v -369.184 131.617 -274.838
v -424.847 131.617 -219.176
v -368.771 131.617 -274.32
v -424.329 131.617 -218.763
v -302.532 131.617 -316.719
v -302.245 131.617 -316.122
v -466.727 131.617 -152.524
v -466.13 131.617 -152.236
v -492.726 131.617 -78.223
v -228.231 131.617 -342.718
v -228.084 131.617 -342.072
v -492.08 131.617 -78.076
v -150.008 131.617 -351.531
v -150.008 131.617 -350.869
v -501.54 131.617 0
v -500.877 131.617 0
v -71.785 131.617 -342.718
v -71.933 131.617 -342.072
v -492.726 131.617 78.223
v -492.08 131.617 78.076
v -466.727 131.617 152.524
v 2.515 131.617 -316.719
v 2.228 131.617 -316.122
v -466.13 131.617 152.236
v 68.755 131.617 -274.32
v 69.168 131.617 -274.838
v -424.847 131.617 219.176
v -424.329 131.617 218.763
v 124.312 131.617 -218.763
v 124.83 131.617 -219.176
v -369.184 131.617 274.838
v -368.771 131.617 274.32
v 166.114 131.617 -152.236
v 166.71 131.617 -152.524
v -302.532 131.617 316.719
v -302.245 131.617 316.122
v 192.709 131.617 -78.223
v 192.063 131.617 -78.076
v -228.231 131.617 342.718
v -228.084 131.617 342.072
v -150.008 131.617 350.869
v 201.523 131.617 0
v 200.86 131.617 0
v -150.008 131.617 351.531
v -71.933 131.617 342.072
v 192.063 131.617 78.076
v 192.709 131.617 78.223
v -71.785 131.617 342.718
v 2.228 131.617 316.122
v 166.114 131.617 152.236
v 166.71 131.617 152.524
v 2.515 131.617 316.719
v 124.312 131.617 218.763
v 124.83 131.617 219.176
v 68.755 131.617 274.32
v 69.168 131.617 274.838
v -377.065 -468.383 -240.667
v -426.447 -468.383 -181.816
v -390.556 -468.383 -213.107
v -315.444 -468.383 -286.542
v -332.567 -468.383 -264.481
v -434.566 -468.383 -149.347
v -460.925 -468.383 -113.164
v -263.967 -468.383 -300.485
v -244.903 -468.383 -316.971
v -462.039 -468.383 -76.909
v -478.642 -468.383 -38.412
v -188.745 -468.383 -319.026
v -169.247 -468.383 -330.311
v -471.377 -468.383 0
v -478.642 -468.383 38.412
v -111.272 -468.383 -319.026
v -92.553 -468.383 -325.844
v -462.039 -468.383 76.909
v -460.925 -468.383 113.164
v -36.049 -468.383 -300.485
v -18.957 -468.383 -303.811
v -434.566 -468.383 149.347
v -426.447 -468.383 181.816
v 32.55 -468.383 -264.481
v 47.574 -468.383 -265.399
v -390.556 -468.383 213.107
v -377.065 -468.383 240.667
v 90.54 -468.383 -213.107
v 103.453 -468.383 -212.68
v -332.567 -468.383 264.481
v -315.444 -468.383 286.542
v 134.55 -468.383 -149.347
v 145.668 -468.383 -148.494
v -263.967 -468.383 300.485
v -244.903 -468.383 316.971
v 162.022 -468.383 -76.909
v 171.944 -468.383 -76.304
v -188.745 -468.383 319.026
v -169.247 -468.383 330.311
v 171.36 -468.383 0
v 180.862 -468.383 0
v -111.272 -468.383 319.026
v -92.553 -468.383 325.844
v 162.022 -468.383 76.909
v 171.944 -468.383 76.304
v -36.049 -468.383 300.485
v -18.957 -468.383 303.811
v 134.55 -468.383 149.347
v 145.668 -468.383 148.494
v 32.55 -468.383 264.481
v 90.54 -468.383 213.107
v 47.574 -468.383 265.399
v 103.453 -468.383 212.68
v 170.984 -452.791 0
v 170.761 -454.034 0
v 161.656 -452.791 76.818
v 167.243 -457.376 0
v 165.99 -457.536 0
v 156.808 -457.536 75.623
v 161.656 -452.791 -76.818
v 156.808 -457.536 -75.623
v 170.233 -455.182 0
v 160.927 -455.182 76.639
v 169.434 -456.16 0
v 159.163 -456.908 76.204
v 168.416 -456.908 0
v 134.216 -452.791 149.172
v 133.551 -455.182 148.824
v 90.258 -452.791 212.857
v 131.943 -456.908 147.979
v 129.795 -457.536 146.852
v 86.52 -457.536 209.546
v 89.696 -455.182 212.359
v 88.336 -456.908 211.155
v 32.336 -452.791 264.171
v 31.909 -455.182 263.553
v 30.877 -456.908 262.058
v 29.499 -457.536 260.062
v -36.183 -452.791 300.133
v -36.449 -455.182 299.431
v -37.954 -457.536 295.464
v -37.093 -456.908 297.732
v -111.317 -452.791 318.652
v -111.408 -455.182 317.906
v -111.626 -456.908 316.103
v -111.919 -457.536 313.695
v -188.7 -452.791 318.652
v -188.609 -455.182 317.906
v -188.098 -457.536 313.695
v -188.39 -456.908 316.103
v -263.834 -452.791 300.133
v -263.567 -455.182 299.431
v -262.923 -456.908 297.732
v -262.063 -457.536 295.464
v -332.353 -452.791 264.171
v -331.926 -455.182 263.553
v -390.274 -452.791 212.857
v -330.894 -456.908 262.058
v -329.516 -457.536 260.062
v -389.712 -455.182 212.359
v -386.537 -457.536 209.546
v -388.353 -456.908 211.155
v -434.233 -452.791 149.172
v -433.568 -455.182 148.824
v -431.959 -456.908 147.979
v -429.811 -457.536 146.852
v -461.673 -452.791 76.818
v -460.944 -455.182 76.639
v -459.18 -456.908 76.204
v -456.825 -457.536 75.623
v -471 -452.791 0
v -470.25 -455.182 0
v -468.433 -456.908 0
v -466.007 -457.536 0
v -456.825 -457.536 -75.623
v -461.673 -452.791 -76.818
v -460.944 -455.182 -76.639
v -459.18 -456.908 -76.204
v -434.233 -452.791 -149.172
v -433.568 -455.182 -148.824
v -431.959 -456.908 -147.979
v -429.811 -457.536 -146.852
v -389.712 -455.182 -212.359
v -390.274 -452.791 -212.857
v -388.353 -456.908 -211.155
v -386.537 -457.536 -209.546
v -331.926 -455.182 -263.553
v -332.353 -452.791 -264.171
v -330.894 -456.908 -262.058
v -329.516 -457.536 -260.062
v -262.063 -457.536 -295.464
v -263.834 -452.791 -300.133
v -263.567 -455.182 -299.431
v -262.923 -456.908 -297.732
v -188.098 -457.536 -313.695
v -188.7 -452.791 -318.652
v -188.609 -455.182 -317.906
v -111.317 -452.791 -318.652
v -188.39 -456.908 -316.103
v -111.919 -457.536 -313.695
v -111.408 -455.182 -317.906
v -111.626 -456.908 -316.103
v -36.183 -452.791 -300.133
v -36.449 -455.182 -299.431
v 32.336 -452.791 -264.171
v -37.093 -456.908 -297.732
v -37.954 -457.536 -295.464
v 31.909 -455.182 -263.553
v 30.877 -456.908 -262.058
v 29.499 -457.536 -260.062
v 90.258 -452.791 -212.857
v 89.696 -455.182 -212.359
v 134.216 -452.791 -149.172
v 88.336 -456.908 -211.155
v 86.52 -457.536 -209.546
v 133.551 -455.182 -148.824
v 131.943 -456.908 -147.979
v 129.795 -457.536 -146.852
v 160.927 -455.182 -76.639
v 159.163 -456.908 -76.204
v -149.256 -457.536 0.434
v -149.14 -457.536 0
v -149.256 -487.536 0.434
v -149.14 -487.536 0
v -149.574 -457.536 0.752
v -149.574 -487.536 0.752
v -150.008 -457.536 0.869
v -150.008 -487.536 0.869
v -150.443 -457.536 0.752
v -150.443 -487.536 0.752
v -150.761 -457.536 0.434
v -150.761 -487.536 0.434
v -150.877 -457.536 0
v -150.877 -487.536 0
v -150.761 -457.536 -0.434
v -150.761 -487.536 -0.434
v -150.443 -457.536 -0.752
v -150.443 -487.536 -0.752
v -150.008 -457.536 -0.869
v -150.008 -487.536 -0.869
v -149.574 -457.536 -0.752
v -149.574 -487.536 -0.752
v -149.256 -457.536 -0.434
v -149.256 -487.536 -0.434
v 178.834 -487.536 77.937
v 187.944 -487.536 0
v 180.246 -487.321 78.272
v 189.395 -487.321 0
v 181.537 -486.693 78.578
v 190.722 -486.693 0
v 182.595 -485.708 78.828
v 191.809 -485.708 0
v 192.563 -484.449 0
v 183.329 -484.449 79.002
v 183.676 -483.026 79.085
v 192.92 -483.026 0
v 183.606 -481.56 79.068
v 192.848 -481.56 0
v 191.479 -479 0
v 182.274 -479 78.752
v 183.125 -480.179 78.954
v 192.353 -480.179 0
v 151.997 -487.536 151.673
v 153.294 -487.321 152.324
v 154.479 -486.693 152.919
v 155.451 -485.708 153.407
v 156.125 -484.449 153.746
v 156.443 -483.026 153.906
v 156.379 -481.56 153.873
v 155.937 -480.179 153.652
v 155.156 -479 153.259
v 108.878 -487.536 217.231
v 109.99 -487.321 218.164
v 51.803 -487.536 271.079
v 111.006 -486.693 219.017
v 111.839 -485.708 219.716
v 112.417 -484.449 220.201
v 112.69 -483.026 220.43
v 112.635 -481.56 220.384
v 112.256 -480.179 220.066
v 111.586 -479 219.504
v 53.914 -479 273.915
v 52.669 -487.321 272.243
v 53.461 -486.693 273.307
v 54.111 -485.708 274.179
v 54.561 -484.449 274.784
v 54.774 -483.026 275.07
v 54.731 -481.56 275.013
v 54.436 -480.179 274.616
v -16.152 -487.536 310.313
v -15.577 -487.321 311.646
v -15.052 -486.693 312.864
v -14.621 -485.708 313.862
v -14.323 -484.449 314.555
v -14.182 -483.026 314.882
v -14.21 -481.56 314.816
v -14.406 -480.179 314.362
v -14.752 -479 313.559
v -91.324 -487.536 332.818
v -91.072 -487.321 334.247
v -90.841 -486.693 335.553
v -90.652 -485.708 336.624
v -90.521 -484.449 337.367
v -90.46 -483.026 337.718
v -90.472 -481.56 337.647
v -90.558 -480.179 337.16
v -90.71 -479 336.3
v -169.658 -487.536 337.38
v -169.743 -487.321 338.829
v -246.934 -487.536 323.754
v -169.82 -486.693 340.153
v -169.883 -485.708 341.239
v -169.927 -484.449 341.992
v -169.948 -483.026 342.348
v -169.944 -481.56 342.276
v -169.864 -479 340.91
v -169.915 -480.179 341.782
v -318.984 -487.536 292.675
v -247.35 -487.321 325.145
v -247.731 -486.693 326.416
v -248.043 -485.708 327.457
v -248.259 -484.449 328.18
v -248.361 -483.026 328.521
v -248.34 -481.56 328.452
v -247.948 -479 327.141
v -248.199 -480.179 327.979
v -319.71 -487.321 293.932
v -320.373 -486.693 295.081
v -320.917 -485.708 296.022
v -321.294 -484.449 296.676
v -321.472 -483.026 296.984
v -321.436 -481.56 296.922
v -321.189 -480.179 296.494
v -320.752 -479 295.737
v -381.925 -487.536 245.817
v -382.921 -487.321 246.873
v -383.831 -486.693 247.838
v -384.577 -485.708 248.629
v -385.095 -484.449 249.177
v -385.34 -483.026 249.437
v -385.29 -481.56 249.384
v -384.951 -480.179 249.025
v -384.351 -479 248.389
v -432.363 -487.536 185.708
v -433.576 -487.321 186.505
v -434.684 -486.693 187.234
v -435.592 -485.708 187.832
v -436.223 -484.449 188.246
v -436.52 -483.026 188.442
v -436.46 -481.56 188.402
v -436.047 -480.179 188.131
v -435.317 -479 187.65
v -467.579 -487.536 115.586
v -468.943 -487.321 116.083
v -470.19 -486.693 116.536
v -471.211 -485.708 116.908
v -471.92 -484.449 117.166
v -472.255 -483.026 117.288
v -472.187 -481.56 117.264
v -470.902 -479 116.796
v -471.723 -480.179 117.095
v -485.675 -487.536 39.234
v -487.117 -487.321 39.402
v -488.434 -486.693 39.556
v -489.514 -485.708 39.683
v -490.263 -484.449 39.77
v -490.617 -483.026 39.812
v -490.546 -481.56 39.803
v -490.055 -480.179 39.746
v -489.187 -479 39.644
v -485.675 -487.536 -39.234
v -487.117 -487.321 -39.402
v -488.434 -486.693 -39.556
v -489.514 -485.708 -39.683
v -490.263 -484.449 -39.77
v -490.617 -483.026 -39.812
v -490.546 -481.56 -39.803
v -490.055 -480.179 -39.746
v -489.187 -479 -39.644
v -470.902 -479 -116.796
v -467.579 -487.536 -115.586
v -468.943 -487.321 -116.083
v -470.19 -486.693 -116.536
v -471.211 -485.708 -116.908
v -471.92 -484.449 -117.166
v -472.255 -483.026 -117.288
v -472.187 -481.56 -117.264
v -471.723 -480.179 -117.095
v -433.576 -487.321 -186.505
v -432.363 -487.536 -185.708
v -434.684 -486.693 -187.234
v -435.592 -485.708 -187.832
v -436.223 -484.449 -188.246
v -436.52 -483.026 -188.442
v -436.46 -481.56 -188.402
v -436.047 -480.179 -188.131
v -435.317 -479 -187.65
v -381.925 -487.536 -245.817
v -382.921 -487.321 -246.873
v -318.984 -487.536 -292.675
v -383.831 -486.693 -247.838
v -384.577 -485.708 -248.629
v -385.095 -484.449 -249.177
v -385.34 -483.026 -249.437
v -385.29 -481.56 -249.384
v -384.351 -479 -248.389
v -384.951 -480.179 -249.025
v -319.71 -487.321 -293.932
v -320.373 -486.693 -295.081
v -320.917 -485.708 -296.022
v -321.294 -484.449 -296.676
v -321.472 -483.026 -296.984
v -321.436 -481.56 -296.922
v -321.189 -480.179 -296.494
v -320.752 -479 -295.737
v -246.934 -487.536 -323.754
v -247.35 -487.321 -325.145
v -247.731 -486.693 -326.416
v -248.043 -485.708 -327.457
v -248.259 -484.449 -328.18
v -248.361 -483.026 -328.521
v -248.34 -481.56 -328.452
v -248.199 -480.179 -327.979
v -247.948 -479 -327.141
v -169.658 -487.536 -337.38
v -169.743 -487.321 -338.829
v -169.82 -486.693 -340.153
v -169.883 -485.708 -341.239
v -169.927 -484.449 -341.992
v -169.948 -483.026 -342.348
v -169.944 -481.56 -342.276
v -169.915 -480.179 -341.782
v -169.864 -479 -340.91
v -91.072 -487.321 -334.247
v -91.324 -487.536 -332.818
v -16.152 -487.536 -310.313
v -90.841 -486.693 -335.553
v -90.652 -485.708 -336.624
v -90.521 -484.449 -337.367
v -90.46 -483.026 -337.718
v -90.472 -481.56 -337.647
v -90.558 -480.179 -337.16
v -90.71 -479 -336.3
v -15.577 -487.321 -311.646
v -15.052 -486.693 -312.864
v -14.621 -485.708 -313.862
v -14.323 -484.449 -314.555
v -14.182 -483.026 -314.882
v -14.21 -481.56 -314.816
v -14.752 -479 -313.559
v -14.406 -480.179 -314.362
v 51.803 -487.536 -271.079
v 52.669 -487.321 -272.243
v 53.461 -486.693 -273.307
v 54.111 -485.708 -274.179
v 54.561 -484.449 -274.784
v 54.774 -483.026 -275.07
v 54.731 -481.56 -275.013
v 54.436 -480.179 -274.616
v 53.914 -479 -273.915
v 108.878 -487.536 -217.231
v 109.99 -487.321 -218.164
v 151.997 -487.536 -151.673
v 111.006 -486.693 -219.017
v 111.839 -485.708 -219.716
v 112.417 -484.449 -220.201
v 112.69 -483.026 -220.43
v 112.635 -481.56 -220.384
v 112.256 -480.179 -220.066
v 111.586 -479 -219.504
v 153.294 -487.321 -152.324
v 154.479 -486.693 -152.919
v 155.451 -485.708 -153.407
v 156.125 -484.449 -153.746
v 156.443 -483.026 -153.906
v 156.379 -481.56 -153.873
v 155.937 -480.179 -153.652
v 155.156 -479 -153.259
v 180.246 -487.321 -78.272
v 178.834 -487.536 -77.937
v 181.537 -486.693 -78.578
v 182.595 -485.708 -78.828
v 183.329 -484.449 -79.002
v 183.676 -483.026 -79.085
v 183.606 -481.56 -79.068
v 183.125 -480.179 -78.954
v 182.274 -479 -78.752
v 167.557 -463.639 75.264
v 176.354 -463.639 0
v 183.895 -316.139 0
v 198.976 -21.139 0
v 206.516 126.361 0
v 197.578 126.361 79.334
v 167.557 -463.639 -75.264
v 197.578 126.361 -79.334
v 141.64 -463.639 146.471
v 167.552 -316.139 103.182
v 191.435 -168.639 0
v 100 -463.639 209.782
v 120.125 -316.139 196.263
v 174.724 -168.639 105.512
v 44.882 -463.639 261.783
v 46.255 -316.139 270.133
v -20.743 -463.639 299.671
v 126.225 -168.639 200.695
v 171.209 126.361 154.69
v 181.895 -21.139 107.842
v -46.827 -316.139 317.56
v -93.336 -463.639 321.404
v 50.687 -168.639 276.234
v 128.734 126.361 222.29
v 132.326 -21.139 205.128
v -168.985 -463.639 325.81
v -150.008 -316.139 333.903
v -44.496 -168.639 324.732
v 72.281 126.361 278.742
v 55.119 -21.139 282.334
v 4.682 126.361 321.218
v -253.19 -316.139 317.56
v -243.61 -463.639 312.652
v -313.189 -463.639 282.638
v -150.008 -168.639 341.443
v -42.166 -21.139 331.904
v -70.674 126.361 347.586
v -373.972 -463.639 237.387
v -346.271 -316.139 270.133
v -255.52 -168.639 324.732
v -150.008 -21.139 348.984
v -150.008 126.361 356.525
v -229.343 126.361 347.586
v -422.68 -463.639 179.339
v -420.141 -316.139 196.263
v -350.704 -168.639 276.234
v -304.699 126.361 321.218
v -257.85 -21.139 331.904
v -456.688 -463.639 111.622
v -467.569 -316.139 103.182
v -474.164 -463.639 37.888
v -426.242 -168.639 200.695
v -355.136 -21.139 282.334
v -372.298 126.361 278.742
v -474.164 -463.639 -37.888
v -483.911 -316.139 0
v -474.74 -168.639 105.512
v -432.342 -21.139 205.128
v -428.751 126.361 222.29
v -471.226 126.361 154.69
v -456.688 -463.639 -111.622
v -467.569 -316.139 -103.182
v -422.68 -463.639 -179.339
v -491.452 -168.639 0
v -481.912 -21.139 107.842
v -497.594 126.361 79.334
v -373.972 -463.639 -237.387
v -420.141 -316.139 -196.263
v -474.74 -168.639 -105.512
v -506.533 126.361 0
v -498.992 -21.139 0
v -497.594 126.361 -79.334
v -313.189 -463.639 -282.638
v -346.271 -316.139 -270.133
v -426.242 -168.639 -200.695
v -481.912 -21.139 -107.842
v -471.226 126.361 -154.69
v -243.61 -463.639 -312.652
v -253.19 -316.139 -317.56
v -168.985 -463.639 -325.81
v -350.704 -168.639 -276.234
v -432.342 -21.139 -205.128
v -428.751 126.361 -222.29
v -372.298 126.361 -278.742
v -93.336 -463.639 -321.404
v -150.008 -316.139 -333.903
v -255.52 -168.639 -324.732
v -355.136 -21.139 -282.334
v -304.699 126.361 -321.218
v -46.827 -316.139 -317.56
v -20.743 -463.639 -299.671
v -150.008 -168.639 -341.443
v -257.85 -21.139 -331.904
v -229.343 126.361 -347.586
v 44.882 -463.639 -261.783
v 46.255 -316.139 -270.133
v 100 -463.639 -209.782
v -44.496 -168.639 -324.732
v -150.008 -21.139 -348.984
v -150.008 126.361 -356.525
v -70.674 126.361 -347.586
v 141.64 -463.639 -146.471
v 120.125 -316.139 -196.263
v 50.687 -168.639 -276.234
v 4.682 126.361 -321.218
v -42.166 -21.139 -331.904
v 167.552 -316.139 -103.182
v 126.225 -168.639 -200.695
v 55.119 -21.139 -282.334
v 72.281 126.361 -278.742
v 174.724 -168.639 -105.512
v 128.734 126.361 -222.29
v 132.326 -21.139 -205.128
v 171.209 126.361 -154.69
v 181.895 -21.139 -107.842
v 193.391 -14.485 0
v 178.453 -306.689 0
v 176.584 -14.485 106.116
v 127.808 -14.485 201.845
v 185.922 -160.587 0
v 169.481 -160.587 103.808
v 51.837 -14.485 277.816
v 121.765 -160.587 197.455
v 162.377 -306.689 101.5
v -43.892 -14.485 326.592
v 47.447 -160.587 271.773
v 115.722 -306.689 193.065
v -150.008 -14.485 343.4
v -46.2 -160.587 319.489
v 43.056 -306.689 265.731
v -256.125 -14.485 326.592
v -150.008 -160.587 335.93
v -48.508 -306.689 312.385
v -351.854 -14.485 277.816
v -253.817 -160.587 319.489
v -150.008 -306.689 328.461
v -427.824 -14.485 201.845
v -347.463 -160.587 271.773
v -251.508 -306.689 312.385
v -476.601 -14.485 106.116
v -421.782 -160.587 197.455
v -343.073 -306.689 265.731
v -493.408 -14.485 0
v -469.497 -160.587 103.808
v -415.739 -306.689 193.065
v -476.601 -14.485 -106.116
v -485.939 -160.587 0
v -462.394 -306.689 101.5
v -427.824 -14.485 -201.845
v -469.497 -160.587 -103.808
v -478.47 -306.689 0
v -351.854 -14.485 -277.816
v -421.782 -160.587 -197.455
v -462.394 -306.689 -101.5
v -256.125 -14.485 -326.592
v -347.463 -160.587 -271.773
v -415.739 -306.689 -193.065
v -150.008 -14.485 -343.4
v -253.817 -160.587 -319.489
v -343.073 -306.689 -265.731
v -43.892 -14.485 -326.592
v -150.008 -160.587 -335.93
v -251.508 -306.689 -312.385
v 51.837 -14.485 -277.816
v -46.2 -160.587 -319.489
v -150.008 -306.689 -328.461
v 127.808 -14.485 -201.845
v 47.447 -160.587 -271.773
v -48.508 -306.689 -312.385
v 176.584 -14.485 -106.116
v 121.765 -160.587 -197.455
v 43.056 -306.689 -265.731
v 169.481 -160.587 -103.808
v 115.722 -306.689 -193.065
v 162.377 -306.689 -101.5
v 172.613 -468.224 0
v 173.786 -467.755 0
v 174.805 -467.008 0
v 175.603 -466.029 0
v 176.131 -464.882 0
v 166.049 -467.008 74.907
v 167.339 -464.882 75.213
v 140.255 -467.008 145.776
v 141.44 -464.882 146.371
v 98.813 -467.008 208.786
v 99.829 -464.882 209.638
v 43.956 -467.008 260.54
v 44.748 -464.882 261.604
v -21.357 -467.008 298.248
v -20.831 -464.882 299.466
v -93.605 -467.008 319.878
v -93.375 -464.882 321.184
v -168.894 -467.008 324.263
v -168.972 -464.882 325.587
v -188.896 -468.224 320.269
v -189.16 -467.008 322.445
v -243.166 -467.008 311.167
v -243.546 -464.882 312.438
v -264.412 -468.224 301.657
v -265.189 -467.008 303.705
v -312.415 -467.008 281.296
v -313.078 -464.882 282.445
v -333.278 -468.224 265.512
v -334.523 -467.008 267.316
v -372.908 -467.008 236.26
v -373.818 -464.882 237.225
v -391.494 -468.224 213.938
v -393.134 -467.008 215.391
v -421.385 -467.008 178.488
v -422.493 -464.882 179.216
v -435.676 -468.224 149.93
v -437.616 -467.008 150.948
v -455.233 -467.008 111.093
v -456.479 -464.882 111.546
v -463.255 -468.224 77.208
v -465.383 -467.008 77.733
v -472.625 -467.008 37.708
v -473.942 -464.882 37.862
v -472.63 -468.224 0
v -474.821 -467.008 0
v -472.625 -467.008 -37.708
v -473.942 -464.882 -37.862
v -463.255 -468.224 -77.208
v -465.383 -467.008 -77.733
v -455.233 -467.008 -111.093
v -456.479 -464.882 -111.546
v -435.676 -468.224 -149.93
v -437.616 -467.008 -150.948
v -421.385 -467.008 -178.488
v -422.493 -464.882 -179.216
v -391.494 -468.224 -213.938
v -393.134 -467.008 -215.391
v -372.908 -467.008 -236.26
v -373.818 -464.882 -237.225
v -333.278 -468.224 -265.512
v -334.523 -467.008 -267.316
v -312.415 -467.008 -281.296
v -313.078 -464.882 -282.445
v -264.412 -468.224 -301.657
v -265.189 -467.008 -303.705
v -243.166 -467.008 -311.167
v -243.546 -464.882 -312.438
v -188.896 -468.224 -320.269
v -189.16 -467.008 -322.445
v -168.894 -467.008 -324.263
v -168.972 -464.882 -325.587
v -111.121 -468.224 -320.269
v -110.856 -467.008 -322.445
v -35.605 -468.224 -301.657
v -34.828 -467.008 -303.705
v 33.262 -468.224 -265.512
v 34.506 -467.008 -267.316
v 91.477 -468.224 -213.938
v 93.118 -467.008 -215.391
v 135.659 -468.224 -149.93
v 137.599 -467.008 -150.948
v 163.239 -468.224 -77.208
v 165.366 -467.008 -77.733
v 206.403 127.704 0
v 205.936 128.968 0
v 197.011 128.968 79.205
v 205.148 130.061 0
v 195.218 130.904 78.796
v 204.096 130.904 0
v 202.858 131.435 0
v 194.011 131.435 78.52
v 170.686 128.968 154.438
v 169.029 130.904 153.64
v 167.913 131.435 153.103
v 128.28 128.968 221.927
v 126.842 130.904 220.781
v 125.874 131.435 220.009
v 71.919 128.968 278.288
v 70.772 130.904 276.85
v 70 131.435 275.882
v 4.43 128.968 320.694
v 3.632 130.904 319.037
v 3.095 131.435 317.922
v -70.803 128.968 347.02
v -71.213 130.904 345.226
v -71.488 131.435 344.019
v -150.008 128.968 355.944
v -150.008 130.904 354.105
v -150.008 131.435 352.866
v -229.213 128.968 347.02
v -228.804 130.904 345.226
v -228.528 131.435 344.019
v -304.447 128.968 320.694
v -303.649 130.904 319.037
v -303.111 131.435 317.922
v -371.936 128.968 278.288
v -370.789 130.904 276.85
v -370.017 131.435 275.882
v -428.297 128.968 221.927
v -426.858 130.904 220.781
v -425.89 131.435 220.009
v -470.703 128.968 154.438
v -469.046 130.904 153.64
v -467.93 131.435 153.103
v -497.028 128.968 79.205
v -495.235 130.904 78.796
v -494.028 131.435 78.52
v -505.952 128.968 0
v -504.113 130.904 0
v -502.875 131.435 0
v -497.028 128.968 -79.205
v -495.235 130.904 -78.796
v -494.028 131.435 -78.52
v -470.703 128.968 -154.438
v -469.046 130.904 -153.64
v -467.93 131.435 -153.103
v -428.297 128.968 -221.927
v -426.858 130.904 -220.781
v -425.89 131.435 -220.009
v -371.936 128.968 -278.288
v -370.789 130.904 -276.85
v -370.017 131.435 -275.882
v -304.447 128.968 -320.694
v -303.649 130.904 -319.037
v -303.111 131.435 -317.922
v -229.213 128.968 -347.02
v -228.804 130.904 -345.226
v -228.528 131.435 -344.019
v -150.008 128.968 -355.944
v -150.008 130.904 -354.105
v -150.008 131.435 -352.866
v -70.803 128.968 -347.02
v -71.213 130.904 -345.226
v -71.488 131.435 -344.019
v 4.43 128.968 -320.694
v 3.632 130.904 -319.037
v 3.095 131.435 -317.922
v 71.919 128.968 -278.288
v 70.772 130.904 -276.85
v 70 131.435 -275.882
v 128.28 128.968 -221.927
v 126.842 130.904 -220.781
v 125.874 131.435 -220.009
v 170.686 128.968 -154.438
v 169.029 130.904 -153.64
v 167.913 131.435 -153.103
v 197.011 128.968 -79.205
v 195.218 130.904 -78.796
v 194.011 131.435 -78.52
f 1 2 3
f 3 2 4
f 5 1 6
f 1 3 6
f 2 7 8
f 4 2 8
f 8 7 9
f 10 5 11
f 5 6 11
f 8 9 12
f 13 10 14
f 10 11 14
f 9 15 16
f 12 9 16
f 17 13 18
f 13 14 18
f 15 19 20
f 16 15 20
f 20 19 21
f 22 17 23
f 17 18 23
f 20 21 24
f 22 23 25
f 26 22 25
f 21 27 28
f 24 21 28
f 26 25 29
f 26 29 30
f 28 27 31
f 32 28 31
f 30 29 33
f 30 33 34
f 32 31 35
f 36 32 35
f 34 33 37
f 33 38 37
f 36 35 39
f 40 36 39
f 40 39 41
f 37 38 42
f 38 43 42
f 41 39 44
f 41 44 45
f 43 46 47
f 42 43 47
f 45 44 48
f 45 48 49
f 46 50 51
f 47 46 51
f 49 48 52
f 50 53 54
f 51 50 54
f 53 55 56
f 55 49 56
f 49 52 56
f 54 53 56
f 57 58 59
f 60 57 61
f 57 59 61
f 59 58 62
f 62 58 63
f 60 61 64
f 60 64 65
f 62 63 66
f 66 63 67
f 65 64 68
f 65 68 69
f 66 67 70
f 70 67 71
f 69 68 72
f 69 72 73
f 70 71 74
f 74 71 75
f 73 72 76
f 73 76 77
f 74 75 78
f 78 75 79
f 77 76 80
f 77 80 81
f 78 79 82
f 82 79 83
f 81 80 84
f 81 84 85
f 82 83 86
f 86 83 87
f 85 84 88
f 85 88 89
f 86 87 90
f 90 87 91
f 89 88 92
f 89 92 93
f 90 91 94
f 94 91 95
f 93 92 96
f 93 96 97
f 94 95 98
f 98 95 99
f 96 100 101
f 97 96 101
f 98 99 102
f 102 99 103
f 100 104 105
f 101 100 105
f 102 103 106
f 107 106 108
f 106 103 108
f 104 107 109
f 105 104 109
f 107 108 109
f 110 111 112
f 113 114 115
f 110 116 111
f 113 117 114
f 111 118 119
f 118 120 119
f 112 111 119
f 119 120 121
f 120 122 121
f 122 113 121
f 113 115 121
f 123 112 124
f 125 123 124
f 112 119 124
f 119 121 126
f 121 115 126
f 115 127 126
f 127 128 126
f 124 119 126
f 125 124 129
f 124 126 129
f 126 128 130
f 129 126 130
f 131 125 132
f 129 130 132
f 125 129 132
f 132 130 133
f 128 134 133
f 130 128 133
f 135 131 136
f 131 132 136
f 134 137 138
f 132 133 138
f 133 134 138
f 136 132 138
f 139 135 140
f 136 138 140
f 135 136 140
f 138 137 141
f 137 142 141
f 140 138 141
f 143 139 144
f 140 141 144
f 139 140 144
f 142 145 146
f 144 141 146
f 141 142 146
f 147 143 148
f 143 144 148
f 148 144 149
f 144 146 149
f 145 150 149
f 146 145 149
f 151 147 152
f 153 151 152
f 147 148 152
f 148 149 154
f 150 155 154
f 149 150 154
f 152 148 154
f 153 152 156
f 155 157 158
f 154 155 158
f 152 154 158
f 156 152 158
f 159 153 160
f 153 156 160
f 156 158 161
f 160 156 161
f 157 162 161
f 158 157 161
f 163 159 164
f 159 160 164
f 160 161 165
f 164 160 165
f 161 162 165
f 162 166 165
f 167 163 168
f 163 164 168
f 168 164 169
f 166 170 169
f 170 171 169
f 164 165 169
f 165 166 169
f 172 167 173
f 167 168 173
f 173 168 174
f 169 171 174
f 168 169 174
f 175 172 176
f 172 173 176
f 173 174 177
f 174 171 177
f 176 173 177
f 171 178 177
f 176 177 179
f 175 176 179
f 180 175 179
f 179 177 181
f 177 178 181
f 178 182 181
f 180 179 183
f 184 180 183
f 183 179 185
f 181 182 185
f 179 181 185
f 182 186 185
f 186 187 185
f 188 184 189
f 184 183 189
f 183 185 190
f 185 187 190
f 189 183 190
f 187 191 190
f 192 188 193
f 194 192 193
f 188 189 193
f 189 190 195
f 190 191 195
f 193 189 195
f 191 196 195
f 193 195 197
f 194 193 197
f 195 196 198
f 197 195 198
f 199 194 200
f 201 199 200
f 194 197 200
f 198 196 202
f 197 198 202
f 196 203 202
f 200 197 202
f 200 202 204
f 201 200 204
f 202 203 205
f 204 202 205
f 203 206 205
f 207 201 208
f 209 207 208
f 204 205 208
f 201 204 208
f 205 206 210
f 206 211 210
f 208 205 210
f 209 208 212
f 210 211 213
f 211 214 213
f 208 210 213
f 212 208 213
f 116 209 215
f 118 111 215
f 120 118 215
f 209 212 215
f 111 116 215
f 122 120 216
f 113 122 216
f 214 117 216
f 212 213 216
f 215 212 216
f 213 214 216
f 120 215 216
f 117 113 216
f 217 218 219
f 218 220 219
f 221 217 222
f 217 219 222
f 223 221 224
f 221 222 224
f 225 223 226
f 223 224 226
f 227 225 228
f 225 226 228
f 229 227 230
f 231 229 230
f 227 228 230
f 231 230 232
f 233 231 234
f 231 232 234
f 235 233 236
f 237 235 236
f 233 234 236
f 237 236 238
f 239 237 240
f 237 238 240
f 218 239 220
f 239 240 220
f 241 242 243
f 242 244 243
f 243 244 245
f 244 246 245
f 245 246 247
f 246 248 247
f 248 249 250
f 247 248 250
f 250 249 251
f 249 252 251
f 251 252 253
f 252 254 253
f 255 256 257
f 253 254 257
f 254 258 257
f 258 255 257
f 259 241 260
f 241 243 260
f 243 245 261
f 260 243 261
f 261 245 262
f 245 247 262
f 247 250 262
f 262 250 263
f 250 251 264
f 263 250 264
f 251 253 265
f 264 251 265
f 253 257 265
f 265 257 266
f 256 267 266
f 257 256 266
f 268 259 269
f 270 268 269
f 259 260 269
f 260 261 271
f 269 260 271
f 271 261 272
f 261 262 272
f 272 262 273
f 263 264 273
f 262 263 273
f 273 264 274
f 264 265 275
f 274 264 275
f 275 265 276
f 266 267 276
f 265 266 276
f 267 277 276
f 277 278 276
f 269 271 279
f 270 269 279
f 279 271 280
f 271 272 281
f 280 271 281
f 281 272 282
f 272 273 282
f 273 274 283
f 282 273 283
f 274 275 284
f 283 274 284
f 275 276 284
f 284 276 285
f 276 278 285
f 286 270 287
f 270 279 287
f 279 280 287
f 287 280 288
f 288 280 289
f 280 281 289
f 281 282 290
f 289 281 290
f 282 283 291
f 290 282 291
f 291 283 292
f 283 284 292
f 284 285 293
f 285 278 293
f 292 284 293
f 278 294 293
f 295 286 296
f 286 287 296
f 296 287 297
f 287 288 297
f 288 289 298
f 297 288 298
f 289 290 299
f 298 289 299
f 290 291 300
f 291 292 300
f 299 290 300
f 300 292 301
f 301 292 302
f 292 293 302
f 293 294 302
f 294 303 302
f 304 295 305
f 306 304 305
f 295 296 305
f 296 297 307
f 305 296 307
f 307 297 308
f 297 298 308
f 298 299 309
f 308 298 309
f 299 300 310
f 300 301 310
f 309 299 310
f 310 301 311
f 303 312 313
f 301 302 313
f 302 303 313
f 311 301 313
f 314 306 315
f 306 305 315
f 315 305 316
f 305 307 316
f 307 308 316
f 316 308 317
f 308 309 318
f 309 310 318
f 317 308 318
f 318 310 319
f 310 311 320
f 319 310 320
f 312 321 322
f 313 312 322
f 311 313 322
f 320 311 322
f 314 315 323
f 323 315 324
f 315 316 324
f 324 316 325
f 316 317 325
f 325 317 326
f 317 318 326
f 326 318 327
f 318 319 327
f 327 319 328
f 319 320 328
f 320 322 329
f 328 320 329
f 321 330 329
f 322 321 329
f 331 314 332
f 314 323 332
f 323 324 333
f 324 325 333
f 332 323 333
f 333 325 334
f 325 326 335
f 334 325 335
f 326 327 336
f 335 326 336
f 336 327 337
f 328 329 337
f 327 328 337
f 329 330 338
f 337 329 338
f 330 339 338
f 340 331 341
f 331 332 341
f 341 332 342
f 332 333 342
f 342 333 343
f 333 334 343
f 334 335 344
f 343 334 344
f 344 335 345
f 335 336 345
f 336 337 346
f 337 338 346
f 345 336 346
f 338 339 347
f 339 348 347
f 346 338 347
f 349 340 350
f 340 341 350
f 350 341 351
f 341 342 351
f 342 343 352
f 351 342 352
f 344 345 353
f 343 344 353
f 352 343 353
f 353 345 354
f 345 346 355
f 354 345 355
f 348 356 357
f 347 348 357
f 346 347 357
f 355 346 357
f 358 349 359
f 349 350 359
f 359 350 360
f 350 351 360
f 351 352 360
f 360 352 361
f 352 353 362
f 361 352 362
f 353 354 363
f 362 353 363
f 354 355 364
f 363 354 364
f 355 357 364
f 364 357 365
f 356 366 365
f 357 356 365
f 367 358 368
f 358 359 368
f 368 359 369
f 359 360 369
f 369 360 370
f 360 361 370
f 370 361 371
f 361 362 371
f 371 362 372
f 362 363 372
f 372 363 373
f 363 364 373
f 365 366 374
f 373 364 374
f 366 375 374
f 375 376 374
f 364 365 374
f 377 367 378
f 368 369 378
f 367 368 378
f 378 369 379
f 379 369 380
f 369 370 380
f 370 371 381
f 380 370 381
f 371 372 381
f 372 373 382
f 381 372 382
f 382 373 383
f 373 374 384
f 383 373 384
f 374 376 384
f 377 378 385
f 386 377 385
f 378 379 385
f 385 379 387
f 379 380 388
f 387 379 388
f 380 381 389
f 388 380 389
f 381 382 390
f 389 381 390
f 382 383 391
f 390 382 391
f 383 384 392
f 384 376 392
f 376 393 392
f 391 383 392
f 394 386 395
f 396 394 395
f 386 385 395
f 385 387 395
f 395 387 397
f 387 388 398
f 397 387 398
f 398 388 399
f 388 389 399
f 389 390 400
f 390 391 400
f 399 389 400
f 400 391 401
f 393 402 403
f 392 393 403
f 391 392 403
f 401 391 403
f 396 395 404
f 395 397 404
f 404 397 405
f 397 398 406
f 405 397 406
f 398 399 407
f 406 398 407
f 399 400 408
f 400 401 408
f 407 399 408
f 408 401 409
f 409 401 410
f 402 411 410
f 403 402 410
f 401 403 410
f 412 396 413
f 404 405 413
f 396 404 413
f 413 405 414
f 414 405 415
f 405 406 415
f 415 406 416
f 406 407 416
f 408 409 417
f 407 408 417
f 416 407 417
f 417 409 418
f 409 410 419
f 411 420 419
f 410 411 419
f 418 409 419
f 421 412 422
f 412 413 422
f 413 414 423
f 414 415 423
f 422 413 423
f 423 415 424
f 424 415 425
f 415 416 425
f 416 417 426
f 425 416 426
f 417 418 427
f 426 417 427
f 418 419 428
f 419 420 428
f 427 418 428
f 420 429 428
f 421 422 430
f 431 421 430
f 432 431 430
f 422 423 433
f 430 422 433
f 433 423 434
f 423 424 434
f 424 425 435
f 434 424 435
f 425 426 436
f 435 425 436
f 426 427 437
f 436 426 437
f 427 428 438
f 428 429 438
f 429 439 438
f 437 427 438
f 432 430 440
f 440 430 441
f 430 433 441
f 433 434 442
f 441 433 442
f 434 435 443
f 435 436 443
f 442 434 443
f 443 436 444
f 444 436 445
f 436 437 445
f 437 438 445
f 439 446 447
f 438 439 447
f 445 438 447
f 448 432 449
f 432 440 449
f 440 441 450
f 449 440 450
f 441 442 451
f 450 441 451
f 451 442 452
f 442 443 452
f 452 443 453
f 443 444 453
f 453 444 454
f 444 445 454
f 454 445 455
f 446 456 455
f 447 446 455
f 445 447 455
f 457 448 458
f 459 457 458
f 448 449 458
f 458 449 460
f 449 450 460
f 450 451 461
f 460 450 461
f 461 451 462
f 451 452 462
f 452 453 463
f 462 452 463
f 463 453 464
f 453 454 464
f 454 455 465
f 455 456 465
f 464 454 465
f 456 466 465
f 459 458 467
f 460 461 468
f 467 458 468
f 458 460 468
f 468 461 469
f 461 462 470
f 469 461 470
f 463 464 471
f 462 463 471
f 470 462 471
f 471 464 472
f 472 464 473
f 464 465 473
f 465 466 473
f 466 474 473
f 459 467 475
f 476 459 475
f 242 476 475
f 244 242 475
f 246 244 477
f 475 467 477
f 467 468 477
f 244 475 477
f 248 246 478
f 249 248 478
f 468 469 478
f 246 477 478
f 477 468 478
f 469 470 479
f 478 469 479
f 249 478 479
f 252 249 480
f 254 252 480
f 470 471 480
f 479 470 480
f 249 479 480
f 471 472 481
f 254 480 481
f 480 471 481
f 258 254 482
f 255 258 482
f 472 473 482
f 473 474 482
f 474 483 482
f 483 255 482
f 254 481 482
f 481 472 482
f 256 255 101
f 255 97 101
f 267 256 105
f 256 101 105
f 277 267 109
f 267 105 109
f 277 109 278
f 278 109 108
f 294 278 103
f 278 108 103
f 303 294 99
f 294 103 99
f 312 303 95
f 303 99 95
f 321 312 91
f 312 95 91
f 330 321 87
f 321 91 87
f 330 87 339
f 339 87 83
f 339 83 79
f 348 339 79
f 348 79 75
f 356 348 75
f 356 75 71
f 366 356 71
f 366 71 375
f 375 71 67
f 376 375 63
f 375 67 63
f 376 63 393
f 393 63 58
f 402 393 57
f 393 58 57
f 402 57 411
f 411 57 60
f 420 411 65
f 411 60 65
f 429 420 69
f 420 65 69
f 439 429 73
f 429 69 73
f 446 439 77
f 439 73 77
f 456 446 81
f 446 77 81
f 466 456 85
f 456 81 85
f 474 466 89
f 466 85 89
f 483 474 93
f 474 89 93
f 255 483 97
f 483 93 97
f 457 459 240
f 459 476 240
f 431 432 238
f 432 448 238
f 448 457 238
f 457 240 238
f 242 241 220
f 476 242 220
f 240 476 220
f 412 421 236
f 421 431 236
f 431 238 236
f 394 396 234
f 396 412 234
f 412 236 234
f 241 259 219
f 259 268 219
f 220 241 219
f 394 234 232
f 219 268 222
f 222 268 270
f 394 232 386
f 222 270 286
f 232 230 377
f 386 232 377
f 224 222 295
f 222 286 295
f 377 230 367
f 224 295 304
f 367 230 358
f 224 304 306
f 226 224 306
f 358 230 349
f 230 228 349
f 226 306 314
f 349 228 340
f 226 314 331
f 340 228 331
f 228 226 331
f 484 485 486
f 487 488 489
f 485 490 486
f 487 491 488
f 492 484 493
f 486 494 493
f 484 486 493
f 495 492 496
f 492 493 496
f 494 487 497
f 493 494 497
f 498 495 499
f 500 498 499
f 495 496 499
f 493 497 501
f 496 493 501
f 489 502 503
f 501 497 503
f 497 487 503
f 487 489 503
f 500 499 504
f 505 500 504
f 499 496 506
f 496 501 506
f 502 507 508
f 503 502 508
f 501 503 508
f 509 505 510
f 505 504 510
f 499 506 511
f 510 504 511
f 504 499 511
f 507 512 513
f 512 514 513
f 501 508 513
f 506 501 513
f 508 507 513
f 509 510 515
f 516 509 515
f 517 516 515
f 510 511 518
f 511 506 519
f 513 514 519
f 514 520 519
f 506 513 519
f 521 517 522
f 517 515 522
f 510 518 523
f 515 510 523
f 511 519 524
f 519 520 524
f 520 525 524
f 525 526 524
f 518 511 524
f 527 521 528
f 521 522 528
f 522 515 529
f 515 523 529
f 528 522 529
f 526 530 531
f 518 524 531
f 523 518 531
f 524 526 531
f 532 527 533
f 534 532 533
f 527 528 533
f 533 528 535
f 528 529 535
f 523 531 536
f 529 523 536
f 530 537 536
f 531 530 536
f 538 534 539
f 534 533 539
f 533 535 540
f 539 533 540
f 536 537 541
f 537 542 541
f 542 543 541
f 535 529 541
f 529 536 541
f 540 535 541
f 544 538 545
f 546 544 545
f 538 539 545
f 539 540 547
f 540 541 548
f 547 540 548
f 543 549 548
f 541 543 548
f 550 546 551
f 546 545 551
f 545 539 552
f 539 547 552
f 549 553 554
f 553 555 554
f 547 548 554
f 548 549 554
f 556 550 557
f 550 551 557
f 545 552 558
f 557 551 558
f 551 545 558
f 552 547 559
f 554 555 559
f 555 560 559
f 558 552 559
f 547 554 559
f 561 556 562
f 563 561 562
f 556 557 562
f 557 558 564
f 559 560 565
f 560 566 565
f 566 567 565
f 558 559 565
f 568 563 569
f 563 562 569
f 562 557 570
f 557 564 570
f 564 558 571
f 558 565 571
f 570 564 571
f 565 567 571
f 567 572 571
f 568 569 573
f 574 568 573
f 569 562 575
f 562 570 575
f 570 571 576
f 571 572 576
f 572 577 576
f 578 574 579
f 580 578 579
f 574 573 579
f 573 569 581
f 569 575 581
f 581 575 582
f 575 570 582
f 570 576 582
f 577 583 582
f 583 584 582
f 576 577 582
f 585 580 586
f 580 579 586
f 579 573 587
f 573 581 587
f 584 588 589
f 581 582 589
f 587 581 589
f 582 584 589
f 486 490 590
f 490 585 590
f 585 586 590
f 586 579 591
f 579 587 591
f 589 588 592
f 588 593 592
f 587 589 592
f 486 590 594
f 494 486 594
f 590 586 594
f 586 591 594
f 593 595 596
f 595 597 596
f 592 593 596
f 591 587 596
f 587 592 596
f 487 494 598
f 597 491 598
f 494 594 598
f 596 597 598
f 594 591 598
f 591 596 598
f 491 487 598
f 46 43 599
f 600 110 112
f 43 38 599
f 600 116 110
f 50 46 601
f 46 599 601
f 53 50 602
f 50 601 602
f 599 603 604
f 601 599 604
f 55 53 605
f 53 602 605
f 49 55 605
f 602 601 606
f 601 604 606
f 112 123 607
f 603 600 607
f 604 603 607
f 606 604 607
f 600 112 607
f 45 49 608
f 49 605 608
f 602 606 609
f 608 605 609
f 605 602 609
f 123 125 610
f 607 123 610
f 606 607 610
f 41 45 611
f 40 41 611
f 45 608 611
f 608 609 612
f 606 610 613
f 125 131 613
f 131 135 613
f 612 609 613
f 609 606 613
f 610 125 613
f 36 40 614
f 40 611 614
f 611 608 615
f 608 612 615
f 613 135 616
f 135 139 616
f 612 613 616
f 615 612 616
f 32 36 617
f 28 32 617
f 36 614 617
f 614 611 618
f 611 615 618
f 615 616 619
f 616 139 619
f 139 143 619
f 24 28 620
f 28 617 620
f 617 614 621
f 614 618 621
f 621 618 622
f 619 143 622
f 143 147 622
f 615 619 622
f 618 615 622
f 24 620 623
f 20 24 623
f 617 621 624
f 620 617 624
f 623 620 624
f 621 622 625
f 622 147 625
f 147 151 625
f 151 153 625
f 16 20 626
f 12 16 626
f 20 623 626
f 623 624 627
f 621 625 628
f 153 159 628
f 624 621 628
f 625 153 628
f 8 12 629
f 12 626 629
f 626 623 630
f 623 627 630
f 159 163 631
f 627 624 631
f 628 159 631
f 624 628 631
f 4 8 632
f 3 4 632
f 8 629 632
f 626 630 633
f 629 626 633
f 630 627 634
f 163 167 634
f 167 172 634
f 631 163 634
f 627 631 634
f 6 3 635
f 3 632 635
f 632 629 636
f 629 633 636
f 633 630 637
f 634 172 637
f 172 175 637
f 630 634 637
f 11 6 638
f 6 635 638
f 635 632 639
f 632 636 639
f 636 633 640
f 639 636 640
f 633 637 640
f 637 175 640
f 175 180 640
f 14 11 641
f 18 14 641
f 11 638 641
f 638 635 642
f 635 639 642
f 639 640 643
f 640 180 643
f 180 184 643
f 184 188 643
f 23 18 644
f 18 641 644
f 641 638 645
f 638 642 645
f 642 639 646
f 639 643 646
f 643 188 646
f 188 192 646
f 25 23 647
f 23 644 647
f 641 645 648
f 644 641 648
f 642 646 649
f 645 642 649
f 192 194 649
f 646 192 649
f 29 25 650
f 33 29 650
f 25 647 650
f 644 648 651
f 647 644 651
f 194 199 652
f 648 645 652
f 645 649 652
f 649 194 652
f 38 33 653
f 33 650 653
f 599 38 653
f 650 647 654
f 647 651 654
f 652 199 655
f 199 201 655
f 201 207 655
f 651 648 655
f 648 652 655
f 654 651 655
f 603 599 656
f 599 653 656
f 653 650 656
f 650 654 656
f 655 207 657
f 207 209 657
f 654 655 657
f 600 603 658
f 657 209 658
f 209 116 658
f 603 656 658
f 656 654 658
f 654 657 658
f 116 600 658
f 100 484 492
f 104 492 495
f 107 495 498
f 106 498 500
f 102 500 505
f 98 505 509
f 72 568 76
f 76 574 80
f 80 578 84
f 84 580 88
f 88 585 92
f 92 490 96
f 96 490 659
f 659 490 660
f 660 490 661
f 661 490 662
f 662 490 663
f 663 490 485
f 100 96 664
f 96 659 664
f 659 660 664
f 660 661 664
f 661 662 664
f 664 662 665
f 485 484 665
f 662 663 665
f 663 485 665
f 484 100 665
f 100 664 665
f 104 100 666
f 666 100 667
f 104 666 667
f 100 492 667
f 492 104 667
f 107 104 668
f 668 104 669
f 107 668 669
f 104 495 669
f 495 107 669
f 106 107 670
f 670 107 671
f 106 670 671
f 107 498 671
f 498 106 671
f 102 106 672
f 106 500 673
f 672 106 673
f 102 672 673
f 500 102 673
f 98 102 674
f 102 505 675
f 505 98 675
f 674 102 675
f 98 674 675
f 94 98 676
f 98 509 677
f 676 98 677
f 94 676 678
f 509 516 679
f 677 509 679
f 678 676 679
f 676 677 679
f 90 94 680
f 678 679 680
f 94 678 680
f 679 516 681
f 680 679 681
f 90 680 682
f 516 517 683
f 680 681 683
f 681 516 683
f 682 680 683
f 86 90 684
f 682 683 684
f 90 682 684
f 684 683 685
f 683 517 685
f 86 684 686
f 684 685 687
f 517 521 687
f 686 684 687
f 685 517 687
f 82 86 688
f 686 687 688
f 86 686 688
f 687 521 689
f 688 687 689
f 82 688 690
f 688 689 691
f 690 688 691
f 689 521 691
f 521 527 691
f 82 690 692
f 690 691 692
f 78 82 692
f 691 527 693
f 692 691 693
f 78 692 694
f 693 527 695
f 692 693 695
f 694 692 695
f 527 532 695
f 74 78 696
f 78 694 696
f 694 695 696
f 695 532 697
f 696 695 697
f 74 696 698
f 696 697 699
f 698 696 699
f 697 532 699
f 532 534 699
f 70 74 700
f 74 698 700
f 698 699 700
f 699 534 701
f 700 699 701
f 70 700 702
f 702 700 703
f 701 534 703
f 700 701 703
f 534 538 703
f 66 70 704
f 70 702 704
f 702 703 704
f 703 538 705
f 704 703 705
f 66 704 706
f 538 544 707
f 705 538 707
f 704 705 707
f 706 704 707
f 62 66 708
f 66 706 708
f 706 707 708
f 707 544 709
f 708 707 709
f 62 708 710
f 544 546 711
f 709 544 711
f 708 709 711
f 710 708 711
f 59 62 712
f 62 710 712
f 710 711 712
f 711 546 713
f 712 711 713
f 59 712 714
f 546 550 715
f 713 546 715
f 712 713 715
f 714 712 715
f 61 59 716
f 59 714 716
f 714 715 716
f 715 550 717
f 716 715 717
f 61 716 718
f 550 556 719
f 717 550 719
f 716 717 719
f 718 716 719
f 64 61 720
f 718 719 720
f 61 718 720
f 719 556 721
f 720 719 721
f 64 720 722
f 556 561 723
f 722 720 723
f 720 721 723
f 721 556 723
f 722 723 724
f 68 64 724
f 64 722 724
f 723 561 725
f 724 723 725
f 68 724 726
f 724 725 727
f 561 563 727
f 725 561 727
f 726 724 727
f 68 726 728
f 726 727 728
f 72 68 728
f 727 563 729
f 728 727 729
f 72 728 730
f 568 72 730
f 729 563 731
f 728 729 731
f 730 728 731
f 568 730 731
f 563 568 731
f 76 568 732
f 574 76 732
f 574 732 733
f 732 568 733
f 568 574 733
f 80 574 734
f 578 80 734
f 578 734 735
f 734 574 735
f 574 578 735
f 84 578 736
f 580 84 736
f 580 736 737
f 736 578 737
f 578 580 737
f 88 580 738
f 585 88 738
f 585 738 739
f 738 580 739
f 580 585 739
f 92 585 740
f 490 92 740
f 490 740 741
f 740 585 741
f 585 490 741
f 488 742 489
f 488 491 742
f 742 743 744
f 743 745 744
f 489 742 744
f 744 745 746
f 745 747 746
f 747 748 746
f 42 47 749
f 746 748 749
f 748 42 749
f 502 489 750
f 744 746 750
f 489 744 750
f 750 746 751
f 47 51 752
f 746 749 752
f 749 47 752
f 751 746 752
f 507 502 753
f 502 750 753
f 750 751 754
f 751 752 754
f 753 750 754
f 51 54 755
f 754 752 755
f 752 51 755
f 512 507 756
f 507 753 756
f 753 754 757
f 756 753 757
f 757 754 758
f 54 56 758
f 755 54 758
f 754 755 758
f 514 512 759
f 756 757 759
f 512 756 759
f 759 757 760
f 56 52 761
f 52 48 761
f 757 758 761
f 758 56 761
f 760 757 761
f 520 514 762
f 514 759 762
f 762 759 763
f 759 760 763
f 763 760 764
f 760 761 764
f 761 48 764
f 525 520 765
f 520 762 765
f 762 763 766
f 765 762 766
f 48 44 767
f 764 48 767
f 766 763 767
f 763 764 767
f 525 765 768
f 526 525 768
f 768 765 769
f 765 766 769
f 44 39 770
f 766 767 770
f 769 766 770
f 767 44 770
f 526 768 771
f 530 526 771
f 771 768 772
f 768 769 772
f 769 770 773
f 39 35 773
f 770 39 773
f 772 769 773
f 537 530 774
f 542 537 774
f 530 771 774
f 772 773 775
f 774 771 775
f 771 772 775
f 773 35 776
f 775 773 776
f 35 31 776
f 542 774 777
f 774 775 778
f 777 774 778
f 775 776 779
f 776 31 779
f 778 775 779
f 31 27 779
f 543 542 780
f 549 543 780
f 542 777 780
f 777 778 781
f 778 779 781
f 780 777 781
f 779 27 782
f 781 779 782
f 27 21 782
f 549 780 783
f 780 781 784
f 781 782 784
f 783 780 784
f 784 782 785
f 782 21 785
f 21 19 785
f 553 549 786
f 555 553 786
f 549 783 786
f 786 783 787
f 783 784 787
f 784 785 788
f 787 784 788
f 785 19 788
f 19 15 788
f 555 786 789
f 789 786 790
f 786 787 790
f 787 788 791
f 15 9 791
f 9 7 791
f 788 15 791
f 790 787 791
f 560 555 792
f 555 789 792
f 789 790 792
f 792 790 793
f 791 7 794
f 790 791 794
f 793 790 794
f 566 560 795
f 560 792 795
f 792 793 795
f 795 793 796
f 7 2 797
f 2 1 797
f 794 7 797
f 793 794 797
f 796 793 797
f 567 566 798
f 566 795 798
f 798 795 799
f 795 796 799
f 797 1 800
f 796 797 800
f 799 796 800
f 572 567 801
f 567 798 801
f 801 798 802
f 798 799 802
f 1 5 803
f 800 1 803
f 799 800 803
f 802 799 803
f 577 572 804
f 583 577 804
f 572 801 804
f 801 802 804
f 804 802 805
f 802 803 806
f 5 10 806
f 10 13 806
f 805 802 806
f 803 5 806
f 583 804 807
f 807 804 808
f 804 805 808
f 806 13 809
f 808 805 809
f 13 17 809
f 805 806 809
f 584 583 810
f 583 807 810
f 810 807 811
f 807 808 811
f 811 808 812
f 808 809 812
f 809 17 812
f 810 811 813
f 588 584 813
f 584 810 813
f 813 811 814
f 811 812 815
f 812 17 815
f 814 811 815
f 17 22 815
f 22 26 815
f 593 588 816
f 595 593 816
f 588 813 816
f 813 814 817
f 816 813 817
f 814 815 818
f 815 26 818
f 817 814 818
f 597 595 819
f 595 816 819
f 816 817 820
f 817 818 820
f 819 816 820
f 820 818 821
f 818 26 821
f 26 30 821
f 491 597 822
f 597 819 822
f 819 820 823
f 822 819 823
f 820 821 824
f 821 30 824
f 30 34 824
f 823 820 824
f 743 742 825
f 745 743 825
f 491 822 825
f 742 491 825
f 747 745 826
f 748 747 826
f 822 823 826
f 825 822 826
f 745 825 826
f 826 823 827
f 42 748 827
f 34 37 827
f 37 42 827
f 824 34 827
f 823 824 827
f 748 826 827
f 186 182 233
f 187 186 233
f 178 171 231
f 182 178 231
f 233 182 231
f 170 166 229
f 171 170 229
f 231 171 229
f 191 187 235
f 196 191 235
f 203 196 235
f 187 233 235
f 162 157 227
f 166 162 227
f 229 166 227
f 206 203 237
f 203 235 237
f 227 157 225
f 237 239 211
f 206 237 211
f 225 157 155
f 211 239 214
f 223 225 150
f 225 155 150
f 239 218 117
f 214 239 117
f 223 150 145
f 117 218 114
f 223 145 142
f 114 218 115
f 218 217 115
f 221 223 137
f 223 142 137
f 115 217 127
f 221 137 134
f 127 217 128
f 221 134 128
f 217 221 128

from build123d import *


with BuildPart() as part:
    # Sketch1 → Revolve1 (revolve)
    with BuildSketch(Plane.XY):
        with BuildLine():
            Line((180.862254067, -468.383325669), (171.360424036, -468.383325669))
            ThreePointArc((171.360424036, -468.383325669), (174.804519989, -467.007991593), (176.353902933, -463.638606894))
            Line((176.353902933, -463.638606894), (206.516426137, 126.361393106))
            ThreePointArc((206.516426137, 126.361393106), (205.147613164, 130.060770285), (201.52294724, 131.616674331))
            Line((201.52294724, 131.616674331), (200.860485156, 131.616674331))
            Line((200.860485156, 131.616674331), (170.983852863, -452.791099984))
            ThreePointArc((170.983852863, -452.791099984), (169.434469919, -456.160484683), (165.990373966, -457.535818758))
            Line((165.990373966, -457.535818758), (-149.139514844, -457.535818758))
            Line((-149.139514844, -457.535818758), (-149.139514844, -487.535818758))
            Line((-149.139514844, -487.535818758), (187.943679345, -487.535818758))
            ThreePointArc((187.943679345, -487.535818758), (192.563077007, -484.44923592), (191.479213251, -479.000284853))
            Line((191.479213251, -479.000284853), (180.862254067, -468.383325669))
        make_face()
    revolve(axis=Axis((-150.008312882, -212.837137396, 0), (0, -1, 0)))


solid = part.part
